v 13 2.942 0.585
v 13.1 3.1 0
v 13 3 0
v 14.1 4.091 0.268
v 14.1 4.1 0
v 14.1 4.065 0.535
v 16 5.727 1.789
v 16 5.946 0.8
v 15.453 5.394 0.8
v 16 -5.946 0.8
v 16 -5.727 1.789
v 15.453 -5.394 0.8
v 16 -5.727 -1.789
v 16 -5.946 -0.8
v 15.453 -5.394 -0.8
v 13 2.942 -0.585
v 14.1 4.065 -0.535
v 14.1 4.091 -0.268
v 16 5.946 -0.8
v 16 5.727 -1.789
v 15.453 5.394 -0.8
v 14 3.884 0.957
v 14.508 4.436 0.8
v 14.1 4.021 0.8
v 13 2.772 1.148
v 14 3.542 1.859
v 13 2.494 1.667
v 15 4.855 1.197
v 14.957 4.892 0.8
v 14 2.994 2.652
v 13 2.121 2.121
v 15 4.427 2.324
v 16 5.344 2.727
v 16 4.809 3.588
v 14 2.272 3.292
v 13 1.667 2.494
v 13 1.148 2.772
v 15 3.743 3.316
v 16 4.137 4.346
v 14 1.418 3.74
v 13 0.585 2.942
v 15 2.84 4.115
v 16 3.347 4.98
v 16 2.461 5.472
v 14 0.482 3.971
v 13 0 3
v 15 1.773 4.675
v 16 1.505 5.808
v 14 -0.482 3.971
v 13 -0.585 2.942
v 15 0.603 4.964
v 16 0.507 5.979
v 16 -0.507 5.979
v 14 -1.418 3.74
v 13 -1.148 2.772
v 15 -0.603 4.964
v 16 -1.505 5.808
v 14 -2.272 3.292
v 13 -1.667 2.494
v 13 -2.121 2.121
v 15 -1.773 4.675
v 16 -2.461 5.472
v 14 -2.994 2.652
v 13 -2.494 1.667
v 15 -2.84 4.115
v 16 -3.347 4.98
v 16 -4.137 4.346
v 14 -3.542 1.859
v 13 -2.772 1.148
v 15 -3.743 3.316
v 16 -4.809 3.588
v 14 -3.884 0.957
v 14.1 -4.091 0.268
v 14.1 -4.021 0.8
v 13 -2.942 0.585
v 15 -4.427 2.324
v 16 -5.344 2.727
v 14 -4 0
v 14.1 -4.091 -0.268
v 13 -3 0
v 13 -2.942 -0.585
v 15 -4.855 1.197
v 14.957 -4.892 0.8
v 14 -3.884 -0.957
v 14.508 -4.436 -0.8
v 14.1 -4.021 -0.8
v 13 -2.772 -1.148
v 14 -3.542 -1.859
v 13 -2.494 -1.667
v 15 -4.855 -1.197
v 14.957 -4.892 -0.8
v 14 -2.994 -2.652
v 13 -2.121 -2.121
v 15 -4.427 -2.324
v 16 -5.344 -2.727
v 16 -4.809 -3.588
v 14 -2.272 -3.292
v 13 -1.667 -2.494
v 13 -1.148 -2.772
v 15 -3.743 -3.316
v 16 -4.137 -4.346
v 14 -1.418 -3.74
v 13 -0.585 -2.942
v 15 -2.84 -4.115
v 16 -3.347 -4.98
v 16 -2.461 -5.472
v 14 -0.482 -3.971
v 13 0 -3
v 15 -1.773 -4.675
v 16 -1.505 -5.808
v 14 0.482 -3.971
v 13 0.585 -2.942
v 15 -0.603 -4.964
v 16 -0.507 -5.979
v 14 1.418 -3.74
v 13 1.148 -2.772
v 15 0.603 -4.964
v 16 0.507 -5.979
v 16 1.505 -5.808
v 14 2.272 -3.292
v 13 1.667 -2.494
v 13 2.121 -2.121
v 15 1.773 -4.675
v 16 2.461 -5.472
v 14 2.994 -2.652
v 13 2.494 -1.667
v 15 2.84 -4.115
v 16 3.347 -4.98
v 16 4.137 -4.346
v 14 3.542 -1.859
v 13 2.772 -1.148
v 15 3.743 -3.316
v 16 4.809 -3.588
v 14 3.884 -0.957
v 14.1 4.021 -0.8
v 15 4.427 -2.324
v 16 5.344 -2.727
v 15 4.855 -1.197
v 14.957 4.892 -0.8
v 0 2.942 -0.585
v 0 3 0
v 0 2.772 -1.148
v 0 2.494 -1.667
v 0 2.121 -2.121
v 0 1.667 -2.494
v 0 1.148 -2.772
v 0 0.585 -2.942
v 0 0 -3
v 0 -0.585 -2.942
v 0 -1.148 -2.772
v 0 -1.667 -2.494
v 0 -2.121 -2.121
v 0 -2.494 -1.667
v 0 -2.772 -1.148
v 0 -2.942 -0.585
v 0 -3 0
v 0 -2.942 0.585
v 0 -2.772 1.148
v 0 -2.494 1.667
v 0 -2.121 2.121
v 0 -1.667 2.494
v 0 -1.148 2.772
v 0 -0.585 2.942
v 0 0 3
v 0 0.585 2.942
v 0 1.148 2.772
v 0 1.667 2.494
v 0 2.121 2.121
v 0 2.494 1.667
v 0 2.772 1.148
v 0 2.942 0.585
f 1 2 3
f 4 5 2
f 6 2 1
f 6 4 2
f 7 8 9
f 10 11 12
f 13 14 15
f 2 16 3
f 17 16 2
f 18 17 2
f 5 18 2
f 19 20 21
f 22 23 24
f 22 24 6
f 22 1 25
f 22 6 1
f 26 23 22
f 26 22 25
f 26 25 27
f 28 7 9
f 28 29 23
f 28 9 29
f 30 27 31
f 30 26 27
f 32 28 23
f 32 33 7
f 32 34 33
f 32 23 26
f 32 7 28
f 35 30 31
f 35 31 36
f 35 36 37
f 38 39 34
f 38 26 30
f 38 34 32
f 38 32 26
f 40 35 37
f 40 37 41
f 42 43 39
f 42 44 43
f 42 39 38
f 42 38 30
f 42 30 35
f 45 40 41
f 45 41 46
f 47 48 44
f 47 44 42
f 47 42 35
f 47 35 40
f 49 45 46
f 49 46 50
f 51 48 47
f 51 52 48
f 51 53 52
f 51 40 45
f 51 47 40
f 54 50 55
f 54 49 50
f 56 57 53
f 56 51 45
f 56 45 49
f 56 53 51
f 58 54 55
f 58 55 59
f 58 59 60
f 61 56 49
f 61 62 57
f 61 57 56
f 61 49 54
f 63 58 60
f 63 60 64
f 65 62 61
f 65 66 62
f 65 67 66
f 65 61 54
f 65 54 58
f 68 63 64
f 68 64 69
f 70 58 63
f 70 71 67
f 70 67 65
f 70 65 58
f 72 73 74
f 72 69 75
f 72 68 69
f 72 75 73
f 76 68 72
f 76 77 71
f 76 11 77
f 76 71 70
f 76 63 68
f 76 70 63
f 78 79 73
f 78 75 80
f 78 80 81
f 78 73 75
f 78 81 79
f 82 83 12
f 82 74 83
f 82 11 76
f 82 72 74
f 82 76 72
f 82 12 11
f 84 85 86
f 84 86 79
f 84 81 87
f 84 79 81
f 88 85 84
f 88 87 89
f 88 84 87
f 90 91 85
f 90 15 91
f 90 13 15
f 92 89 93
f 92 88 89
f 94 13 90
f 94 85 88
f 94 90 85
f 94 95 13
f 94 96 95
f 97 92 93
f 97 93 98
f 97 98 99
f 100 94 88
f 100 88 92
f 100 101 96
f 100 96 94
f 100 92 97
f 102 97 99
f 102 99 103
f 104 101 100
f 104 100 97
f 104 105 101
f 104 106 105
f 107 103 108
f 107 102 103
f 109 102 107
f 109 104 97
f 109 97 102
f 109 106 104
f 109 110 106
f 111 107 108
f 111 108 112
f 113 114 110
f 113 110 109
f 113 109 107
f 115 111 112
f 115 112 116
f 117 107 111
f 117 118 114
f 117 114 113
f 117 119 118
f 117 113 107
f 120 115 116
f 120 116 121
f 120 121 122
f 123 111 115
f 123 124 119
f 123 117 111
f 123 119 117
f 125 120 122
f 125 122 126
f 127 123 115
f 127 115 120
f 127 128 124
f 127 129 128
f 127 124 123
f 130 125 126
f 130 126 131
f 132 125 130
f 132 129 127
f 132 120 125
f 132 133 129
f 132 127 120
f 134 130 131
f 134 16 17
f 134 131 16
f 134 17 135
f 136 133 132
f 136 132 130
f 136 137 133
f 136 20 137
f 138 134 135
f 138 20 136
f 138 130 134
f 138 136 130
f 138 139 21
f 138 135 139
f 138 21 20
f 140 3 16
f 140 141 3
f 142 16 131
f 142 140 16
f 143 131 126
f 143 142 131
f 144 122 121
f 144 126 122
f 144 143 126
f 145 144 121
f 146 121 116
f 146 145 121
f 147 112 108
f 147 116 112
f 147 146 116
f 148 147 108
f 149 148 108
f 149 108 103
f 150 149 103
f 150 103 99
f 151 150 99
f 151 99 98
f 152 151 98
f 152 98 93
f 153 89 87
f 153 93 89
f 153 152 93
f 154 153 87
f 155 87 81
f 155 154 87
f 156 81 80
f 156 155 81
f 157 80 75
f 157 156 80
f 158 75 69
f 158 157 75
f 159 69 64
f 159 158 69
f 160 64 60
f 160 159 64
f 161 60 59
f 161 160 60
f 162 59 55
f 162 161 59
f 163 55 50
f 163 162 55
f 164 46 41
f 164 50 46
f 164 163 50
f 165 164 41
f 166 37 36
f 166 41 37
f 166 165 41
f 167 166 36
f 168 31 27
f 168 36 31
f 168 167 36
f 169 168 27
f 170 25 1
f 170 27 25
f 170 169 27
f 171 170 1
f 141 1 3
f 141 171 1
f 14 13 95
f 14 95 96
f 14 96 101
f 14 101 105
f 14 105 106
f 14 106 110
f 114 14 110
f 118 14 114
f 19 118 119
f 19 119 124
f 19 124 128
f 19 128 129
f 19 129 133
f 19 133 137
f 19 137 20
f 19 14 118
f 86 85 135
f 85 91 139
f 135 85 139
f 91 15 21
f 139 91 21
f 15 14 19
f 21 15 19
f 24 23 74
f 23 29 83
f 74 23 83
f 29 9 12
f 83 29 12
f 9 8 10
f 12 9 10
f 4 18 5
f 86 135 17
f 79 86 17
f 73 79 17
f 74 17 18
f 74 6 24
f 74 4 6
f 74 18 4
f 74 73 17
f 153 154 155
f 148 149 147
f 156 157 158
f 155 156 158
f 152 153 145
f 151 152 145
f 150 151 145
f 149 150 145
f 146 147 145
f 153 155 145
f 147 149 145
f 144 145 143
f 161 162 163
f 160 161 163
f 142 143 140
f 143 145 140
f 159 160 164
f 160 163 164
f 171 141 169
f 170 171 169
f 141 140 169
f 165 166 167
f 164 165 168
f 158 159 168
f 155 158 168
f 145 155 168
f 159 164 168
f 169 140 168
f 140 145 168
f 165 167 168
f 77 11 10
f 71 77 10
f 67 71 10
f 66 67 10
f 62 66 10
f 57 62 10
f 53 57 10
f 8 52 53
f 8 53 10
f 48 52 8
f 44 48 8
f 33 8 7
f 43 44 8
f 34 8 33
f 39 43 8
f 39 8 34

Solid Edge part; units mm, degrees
sketch "Sketch1" plane through (0, 0, 0) normal (0, 0, 1) x (1, 0, 0)
  line L0 (16, 0) -> (16, 6)
  line L1 (16, 6) -> (13, 3)
  line L2 (13, 3) -> (0, 3)
  line L3 (0, 3) -> (0, 0)
  line L4 (0, 0) -> (16, 0)
revolve "RevolvedProtrusion1" add sketch "Sketch1" angle 360 about axis through (0, 0, 0) along (1, 0, 0)
cosmetic_thread "Thread1" size "M6"
sketch "Sketch2" plane through (16, 0, 0) normal (1, 0, 0) x (0, 1, 0)
  line L0 (6, 0.8) -> (-6, 0.8)
  line L1 (-6, 0.8) -> (-6, -0.8)
  line L2 (-6, -0.8) -> (6, -0.8)
  line L3 (6, -0.8) -> (6, 0.8)
extrude "Cutout1" cut sketch "Sketch2" against normal blind 1.9
